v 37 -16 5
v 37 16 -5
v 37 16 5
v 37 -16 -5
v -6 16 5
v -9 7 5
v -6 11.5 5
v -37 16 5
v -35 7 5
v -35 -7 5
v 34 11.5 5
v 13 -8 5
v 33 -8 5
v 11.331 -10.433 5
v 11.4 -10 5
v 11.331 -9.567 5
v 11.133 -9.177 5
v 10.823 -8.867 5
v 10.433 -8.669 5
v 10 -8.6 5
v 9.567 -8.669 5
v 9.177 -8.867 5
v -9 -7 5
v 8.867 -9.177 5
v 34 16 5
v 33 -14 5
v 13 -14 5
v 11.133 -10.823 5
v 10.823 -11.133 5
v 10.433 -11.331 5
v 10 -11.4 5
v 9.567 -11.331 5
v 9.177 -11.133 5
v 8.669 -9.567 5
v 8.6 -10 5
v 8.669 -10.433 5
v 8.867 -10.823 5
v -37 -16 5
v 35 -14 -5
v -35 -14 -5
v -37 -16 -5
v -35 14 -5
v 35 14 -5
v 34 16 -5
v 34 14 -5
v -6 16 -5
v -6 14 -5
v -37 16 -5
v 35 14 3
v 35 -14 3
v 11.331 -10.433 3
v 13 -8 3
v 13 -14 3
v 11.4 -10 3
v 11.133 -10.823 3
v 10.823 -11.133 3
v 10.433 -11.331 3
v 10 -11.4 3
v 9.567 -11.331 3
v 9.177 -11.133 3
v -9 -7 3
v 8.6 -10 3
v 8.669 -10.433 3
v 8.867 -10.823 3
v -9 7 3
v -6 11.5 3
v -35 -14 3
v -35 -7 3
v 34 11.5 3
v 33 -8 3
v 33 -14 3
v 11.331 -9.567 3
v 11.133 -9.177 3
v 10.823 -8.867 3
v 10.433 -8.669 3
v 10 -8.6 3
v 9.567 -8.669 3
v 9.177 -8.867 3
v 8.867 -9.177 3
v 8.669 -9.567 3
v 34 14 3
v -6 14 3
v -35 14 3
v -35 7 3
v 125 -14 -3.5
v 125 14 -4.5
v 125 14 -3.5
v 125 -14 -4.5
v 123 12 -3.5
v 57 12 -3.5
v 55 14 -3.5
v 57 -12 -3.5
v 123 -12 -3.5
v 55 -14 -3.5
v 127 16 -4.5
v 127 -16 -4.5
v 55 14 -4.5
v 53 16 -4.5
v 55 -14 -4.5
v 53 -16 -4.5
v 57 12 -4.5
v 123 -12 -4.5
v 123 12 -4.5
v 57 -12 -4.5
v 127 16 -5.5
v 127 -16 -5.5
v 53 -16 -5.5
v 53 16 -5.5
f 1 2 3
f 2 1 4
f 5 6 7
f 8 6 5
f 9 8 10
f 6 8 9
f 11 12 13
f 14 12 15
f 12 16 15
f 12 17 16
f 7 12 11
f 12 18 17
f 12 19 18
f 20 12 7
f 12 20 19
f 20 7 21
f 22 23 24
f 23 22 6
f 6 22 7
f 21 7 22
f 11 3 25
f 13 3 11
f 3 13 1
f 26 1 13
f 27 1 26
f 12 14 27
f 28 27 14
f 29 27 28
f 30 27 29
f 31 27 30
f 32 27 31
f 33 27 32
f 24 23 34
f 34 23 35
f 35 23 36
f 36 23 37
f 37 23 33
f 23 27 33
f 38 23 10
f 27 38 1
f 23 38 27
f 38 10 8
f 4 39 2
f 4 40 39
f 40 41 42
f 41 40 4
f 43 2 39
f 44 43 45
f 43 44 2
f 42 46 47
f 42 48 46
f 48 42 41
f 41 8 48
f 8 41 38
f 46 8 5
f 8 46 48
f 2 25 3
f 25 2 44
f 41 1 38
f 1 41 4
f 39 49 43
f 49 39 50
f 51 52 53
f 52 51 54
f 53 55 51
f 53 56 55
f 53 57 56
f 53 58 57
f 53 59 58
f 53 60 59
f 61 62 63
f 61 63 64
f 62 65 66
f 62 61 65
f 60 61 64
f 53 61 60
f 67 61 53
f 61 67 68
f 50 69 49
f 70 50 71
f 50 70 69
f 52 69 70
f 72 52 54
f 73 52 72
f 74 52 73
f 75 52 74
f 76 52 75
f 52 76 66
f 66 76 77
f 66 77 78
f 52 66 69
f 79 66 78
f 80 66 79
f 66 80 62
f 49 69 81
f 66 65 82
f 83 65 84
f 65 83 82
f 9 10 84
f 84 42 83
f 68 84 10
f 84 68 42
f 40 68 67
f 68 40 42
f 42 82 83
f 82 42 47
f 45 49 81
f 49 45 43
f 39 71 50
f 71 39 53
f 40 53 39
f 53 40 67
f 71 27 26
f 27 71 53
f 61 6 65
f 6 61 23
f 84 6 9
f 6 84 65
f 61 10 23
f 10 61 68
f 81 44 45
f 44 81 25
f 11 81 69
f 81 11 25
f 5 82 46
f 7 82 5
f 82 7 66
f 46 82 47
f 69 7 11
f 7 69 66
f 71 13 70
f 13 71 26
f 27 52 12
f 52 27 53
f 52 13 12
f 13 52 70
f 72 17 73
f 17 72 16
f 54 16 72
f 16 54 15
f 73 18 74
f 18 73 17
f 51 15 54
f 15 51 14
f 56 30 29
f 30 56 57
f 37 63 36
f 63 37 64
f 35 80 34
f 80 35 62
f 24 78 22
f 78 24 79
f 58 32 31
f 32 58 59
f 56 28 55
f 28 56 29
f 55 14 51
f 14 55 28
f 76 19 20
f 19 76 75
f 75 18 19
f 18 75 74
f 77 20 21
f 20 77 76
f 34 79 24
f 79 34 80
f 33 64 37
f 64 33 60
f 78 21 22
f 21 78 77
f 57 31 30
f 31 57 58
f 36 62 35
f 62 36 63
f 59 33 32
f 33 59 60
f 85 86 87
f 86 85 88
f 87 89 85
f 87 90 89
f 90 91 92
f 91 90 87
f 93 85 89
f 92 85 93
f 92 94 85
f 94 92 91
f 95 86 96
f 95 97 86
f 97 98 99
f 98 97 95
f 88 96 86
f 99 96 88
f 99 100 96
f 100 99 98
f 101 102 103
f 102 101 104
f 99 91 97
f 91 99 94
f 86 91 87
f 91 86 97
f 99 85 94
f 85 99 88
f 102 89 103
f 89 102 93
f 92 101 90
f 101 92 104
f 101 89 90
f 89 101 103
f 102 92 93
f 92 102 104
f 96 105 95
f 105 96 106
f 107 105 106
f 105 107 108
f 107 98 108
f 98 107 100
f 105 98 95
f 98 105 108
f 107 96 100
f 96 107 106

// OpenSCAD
difference(){
cube([74,32,10],true);



{
translate([0,0,-2])
cube([70,28,10],true);
translate([-22,0,-2])
cube([26,14,20],true);    //display
translate([14,14,-2])  
cube([40,5,20],true);   //I/O
translate([23,-11,-2]) 
cube([20,6,20],true);   //Dipswitch

translate([10,-10,0])
cylinder(30,1.4,1.4,$fn=20);


}




}





translate([90,0,-5])
{
cube([74,32,1],true);
translate([0,0,1])

difference() 
    {
cube([70,28,1],true);
translate([0,0,3])
cube([66,24,8],true);
}

}
